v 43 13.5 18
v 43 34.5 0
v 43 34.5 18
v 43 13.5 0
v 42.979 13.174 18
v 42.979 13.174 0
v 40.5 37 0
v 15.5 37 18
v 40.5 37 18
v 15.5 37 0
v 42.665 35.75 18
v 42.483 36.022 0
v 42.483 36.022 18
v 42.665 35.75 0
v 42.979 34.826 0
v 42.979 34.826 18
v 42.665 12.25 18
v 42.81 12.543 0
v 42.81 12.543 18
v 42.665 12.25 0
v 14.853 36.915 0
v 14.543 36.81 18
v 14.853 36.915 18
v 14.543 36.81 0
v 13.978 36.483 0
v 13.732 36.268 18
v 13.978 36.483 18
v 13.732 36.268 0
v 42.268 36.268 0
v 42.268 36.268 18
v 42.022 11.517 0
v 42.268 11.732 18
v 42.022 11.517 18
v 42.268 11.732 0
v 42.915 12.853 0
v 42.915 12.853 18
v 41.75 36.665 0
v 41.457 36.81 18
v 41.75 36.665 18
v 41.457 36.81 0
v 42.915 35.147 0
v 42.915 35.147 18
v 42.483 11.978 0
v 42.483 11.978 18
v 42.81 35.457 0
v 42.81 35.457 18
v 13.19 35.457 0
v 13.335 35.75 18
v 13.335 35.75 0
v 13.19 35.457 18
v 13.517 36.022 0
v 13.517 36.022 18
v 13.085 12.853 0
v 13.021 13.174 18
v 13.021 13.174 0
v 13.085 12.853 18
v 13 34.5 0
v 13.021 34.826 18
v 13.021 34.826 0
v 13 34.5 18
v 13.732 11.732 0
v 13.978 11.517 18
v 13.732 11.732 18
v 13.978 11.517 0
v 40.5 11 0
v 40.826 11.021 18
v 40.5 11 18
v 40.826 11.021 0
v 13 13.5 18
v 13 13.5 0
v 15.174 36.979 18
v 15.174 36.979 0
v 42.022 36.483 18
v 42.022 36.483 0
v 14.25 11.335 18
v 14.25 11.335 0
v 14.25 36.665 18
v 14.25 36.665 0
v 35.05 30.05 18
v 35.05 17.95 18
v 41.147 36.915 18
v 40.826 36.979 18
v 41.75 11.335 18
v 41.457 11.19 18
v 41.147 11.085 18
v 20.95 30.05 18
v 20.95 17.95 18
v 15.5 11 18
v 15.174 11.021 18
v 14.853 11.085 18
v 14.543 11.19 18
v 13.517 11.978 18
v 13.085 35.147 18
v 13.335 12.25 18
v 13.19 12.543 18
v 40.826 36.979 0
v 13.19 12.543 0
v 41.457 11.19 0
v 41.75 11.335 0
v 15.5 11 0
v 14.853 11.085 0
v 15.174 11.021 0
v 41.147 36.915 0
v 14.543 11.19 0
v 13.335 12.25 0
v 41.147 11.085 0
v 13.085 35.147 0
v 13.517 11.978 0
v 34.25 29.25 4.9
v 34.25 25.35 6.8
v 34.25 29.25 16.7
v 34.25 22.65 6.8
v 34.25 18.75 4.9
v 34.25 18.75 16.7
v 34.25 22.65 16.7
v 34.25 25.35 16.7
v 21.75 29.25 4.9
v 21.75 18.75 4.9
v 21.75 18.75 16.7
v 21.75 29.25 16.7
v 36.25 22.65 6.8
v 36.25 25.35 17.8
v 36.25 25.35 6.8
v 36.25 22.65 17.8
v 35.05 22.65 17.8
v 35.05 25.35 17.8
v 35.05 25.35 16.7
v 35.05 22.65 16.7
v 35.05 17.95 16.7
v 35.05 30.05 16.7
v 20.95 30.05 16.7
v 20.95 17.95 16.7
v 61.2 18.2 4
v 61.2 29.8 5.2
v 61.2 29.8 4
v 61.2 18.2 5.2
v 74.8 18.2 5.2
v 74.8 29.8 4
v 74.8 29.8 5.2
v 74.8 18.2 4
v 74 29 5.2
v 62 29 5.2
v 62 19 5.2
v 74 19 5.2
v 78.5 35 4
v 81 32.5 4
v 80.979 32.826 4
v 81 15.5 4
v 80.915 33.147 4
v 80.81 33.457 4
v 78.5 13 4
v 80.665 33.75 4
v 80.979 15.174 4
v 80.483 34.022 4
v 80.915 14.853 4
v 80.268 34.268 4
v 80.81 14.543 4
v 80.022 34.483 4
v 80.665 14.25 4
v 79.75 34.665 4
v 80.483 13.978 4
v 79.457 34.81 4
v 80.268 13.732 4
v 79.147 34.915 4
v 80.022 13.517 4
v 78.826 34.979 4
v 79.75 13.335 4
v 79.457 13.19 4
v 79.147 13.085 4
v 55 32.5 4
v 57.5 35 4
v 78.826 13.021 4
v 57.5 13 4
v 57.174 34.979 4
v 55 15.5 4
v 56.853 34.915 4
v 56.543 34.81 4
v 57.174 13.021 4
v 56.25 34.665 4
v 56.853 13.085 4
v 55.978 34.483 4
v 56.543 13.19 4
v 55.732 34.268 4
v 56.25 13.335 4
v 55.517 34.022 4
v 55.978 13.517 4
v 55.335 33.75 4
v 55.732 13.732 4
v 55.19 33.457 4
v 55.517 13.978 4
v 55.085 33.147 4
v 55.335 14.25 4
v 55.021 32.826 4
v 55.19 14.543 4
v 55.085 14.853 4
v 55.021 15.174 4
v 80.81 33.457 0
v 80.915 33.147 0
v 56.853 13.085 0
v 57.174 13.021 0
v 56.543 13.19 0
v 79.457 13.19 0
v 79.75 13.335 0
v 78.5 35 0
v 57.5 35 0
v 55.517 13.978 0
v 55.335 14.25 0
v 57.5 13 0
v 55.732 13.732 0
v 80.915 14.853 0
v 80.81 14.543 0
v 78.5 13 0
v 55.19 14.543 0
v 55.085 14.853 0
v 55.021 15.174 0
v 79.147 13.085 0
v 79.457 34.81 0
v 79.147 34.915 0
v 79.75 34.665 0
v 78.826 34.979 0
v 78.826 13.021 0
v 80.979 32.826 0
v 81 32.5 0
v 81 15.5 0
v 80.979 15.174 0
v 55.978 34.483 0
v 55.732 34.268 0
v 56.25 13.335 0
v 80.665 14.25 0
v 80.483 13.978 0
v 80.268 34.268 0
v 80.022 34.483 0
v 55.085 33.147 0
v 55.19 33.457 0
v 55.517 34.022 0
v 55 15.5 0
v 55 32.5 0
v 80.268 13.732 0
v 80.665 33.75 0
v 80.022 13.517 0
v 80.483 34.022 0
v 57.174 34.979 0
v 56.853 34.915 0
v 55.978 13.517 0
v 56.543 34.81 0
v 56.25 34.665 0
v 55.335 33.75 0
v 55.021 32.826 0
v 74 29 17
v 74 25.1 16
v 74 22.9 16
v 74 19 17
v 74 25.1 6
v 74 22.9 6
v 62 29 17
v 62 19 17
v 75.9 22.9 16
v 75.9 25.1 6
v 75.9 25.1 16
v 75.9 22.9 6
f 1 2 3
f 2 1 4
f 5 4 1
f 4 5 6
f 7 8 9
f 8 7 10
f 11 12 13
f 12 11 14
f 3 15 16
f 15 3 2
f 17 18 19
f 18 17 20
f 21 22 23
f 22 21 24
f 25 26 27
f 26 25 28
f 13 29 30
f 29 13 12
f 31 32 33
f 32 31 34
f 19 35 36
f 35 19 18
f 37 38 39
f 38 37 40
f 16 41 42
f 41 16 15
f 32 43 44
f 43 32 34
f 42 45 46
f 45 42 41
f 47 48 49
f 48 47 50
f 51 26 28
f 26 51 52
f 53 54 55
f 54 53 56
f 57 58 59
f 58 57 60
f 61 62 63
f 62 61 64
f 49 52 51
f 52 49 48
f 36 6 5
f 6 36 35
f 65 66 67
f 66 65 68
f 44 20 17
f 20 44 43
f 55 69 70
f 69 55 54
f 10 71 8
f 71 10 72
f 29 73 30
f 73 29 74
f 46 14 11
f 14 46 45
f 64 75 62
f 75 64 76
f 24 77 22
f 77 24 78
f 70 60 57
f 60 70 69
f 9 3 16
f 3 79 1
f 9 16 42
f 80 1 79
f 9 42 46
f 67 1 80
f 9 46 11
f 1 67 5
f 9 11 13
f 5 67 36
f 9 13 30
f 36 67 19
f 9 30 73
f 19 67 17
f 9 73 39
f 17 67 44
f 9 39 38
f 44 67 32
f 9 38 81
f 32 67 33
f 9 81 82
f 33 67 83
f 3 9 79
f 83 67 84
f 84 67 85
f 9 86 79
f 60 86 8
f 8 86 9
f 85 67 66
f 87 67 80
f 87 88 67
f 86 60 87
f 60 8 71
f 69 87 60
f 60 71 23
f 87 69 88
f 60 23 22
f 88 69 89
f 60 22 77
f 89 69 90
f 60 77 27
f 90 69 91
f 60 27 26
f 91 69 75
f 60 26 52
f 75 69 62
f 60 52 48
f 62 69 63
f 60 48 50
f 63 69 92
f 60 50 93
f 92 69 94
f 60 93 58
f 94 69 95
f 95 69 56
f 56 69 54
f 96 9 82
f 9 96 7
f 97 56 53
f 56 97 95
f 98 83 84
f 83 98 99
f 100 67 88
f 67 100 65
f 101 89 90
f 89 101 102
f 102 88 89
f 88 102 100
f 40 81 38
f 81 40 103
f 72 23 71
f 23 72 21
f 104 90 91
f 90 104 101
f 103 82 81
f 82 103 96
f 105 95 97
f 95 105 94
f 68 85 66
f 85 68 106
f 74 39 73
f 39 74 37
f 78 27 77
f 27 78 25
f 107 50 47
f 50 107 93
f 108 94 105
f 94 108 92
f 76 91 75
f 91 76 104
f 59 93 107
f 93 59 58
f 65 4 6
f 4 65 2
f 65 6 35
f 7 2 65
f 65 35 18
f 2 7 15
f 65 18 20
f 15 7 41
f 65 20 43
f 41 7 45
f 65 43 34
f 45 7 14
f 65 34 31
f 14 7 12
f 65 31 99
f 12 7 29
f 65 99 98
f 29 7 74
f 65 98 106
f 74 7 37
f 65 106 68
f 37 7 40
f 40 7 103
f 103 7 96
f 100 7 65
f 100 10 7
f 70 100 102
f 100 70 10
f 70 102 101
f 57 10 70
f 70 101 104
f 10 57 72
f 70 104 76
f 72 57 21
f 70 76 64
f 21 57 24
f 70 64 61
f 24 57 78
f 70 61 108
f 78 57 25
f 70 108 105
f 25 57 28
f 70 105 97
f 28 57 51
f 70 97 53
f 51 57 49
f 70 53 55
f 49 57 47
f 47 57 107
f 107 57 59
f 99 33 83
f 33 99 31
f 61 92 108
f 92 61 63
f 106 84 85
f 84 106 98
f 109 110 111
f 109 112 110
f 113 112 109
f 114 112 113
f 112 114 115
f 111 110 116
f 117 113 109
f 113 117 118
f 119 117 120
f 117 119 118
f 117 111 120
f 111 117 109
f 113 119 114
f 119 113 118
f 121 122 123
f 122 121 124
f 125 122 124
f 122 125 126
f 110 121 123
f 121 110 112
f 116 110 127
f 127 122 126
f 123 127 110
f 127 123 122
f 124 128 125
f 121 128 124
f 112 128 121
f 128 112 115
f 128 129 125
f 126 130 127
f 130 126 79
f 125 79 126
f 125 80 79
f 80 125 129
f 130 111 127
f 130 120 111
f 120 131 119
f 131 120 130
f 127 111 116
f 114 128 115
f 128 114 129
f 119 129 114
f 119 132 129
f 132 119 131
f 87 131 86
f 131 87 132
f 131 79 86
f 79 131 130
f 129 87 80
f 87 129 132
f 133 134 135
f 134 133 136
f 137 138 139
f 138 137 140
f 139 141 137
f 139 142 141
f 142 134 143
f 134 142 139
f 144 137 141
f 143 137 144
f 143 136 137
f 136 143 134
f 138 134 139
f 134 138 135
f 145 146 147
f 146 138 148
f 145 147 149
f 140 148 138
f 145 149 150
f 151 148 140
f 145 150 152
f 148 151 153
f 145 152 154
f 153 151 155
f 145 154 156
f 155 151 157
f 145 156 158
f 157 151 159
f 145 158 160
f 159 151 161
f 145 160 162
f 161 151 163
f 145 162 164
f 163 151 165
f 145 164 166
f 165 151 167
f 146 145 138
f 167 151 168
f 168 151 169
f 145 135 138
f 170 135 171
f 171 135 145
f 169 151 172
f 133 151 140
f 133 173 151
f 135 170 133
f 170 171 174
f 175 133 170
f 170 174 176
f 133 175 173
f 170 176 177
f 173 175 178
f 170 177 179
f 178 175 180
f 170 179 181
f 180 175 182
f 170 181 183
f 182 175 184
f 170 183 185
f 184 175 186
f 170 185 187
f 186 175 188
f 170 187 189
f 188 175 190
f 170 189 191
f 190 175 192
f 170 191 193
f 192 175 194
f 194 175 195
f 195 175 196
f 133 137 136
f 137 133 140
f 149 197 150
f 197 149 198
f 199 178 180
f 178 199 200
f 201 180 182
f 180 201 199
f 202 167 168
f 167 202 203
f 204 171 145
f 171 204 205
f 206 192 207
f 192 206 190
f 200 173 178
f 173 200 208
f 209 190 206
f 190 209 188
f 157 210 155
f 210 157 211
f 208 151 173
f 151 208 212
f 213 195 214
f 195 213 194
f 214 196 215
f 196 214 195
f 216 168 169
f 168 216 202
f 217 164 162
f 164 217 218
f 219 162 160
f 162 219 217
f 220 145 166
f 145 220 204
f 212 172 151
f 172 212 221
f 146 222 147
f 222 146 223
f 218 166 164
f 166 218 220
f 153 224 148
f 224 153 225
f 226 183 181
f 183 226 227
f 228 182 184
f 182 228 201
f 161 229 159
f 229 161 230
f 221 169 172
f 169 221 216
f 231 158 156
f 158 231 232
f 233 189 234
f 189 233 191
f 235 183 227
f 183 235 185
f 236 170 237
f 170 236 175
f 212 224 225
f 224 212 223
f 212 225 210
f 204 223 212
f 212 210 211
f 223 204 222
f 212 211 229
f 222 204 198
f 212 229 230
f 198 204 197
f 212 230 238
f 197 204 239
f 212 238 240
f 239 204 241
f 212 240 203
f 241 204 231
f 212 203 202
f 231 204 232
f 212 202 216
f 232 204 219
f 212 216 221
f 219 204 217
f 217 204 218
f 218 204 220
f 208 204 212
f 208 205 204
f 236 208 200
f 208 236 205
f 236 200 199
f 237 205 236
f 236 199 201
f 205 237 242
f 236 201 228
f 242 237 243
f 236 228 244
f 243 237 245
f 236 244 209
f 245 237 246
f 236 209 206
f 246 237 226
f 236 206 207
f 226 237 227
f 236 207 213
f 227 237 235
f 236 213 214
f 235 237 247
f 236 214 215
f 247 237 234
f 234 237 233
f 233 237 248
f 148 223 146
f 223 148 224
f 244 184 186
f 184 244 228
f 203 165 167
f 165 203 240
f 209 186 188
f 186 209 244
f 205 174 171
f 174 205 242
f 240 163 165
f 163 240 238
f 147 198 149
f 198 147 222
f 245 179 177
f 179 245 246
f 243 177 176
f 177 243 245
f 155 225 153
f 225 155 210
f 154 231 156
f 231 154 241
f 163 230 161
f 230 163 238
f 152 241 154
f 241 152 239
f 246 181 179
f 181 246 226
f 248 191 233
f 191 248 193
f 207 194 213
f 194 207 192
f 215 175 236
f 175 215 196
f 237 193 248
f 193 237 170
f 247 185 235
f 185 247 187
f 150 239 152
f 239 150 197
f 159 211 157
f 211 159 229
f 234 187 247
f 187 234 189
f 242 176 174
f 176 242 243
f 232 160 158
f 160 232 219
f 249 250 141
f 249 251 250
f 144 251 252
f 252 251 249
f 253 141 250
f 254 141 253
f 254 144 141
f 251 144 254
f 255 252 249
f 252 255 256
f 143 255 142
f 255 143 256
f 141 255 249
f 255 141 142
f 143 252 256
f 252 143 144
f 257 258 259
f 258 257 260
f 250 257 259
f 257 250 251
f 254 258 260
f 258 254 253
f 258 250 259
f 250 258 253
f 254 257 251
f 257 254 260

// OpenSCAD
/*
Sample 042: Verdrehsichere Schlüssel-Steckverbindung — 0,25 mm
Generated from the FDM Mechanical Sample Library.
Units: millimetres.

Override examples:
  openscad -o custom.stl -D 'view="plate"' -D 'render_fn=64' model.scad
  openscad -o preview.png -D 'view="assembly"' model.scad
*/
use <../../../library/fdm_mechanisms.scad>

render_fn = is_undef(render_fn) ? 48 : render_fn;
view = is_undef(view) ? "plate" : view;
$fn = render_fn;

sample_keyed_plug_socket(
    view=view,
    clearance=0.25
);
